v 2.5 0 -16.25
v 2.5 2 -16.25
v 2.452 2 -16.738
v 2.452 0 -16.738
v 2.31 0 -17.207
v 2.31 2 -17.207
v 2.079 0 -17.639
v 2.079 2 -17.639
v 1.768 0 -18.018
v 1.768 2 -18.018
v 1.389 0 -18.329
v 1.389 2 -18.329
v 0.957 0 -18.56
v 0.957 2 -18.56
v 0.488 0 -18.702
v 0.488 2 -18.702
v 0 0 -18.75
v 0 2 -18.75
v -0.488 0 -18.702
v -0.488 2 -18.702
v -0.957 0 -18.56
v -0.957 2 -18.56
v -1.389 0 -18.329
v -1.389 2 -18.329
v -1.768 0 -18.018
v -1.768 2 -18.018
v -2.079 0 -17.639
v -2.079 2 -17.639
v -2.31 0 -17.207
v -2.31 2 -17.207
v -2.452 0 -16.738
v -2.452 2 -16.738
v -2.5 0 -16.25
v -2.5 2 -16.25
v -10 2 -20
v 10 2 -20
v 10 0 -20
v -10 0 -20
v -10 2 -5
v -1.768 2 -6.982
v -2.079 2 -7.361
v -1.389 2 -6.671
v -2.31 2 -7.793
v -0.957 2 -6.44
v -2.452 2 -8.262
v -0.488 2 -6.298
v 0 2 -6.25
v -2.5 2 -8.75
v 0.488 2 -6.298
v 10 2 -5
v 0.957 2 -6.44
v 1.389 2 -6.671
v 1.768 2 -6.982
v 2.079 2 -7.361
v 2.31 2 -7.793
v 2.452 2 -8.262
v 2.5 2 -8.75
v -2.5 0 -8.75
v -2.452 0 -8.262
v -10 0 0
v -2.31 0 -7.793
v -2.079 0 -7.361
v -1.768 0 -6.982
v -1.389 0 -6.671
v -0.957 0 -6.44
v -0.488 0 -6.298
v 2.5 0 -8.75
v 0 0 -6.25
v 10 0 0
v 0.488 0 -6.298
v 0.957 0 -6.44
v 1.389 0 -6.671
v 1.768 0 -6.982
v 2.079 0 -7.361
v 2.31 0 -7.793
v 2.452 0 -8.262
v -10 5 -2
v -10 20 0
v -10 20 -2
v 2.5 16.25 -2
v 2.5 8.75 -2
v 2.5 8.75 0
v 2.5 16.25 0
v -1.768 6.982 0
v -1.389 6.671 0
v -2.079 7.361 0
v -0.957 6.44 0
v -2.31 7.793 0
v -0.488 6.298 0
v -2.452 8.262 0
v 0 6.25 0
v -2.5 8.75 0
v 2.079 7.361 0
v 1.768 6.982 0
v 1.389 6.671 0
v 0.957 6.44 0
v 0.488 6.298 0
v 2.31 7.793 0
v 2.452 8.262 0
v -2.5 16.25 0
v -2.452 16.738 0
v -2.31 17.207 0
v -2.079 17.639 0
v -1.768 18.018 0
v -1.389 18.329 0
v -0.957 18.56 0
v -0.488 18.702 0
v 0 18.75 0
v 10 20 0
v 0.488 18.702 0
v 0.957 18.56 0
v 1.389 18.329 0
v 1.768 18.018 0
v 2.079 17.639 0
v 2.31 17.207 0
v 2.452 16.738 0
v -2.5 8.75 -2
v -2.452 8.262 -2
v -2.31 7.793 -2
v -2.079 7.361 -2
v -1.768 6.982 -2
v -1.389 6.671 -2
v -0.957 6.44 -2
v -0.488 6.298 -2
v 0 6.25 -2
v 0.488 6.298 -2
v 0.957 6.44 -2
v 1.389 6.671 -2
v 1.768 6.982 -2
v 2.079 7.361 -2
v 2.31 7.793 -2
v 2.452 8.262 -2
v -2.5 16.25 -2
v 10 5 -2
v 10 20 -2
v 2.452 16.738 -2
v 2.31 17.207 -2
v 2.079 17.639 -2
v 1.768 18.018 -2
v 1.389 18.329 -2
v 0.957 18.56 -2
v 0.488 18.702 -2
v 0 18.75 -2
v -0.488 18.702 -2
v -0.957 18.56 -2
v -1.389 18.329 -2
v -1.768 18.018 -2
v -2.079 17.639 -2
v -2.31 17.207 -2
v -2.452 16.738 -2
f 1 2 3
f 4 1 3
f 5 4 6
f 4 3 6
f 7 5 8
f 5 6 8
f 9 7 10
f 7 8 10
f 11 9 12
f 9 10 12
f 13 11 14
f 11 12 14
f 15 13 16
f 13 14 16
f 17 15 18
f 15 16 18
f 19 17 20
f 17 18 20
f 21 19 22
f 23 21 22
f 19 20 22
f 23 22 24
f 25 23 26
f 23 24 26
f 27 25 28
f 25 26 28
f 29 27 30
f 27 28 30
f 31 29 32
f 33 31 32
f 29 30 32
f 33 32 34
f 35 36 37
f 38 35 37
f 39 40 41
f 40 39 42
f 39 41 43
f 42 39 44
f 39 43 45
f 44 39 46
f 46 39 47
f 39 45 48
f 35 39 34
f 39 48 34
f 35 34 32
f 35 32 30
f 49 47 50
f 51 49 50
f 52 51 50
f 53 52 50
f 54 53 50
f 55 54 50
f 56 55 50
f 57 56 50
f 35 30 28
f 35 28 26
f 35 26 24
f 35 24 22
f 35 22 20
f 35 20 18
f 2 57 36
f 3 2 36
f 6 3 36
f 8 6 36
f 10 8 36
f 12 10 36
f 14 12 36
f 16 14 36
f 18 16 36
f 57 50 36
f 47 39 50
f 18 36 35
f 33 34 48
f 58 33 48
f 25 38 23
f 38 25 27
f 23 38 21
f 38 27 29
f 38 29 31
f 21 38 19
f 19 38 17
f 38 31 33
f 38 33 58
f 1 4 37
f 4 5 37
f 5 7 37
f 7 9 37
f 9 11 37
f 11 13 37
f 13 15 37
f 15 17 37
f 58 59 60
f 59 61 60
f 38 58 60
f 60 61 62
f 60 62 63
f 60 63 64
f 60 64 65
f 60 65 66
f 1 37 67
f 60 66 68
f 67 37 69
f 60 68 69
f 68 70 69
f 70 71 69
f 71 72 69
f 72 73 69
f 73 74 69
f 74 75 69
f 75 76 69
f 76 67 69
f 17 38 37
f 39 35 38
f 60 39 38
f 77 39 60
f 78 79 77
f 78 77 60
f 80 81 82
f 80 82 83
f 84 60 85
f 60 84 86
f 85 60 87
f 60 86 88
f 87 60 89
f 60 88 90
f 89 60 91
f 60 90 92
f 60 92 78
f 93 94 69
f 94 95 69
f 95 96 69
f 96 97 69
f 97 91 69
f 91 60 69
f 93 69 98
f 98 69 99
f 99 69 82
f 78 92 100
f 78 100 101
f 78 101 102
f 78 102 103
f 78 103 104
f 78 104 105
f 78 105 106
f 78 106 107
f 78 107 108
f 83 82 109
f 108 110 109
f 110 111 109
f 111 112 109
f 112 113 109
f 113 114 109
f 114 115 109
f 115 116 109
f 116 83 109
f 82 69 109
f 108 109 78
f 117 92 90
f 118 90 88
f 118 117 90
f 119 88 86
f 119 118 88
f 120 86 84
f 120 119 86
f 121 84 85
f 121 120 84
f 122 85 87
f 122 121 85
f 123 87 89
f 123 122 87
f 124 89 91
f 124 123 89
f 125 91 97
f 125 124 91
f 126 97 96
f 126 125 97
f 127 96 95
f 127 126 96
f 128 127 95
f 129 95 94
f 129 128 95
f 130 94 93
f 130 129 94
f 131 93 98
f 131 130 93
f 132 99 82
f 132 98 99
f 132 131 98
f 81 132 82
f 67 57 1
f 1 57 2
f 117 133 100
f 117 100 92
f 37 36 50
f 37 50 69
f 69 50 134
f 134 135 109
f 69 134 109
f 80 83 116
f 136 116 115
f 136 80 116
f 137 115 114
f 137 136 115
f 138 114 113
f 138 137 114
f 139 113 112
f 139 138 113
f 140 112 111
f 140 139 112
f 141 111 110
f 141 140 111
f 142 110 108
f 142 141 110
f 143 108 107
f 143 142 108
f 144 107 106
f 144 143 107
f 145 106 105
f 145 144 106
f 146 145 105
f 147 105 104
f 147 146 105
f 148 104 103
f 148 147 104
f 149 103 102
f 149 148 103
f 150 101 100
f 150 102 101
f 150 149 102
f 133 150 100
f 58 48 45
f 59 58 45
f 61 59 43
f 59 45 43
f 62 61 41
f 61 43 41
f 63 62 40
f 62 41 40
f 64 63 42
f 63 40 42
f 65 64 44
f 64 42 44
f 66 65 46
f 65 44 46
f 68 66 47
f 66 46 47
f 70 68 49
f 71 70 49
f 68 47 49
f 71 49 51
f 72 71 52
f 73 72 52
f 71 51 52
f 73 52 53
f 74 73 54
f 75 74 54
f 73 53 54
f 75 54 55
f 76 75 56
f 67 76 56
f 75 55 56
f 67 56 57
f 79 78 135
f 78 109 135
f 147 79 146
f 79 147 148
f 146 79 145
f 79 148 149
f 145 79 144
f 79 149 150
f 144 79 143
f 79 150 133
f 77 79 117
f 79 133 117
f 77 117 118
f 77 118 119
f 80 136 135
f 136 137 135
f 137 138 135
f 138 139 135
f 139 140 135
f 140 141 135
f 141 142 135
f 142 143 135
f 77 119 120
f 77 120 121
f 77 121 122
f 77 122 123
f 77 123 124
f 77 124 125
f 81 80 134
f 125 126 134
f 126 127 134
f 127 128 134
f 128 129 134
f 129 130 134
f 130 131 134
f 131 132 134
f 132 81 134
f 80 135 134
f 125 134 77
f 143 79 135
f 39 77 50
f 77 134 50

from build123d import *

# Parameters (mm, degrees)
BODY_DEPTH          = 10
FIXATION_HOLE_DEPTH = 29.705400189


with BuildPart() as part:
    # Sketch1 → Body (new, symmetric)
    with BuildSketch(Plane(origin=(0, 0, 0), x_dir=(0, 0, -1), z_dir=(1, 0, 0))):
        Polygon((20, 0), (0, 0), (0, 20), (2, 20), (2, 5), (5, 2), (20, 2), align=None)
    extrude(amount=BODY_DEPTH, both=True)

    # Sketch3 → Fixation_Hole (cut, through all)
    with BuildSketch(Plane(origin=(0, 0, -2), x_dir=(-1, 0, 0), z_dir=(0, 0, -1))):
        with BuildLine():
            Line((-2.5, 8.75), (-2.5, 16.25))
            ThreePointArc((-2.5, 16.25), (0, 18.75), (2.5, 16.25))
            Line((2.5, 16.25), (2.5, 8.75))
            ThreePointArc((2.5, 8.75), (0, 6.25), (-2.5, 8.75))
        make_face()
    fixation_hole = extrude(amount=-FIXATION_HOLE_DEPTH, mode=Mode.SUBTRACT)

    # Mirror1: Fixation_Hole across plane
    add(fixation_hole.mirror(Plane(origin=(0, 0, 0), x_dir=(0, -0.7071067811865476, 0.7071067811865475), z_dir=(0, -0.7071067811865475, -0.7071067811865476))), mode=Mode.SUBTRACT)


solid = part.part
